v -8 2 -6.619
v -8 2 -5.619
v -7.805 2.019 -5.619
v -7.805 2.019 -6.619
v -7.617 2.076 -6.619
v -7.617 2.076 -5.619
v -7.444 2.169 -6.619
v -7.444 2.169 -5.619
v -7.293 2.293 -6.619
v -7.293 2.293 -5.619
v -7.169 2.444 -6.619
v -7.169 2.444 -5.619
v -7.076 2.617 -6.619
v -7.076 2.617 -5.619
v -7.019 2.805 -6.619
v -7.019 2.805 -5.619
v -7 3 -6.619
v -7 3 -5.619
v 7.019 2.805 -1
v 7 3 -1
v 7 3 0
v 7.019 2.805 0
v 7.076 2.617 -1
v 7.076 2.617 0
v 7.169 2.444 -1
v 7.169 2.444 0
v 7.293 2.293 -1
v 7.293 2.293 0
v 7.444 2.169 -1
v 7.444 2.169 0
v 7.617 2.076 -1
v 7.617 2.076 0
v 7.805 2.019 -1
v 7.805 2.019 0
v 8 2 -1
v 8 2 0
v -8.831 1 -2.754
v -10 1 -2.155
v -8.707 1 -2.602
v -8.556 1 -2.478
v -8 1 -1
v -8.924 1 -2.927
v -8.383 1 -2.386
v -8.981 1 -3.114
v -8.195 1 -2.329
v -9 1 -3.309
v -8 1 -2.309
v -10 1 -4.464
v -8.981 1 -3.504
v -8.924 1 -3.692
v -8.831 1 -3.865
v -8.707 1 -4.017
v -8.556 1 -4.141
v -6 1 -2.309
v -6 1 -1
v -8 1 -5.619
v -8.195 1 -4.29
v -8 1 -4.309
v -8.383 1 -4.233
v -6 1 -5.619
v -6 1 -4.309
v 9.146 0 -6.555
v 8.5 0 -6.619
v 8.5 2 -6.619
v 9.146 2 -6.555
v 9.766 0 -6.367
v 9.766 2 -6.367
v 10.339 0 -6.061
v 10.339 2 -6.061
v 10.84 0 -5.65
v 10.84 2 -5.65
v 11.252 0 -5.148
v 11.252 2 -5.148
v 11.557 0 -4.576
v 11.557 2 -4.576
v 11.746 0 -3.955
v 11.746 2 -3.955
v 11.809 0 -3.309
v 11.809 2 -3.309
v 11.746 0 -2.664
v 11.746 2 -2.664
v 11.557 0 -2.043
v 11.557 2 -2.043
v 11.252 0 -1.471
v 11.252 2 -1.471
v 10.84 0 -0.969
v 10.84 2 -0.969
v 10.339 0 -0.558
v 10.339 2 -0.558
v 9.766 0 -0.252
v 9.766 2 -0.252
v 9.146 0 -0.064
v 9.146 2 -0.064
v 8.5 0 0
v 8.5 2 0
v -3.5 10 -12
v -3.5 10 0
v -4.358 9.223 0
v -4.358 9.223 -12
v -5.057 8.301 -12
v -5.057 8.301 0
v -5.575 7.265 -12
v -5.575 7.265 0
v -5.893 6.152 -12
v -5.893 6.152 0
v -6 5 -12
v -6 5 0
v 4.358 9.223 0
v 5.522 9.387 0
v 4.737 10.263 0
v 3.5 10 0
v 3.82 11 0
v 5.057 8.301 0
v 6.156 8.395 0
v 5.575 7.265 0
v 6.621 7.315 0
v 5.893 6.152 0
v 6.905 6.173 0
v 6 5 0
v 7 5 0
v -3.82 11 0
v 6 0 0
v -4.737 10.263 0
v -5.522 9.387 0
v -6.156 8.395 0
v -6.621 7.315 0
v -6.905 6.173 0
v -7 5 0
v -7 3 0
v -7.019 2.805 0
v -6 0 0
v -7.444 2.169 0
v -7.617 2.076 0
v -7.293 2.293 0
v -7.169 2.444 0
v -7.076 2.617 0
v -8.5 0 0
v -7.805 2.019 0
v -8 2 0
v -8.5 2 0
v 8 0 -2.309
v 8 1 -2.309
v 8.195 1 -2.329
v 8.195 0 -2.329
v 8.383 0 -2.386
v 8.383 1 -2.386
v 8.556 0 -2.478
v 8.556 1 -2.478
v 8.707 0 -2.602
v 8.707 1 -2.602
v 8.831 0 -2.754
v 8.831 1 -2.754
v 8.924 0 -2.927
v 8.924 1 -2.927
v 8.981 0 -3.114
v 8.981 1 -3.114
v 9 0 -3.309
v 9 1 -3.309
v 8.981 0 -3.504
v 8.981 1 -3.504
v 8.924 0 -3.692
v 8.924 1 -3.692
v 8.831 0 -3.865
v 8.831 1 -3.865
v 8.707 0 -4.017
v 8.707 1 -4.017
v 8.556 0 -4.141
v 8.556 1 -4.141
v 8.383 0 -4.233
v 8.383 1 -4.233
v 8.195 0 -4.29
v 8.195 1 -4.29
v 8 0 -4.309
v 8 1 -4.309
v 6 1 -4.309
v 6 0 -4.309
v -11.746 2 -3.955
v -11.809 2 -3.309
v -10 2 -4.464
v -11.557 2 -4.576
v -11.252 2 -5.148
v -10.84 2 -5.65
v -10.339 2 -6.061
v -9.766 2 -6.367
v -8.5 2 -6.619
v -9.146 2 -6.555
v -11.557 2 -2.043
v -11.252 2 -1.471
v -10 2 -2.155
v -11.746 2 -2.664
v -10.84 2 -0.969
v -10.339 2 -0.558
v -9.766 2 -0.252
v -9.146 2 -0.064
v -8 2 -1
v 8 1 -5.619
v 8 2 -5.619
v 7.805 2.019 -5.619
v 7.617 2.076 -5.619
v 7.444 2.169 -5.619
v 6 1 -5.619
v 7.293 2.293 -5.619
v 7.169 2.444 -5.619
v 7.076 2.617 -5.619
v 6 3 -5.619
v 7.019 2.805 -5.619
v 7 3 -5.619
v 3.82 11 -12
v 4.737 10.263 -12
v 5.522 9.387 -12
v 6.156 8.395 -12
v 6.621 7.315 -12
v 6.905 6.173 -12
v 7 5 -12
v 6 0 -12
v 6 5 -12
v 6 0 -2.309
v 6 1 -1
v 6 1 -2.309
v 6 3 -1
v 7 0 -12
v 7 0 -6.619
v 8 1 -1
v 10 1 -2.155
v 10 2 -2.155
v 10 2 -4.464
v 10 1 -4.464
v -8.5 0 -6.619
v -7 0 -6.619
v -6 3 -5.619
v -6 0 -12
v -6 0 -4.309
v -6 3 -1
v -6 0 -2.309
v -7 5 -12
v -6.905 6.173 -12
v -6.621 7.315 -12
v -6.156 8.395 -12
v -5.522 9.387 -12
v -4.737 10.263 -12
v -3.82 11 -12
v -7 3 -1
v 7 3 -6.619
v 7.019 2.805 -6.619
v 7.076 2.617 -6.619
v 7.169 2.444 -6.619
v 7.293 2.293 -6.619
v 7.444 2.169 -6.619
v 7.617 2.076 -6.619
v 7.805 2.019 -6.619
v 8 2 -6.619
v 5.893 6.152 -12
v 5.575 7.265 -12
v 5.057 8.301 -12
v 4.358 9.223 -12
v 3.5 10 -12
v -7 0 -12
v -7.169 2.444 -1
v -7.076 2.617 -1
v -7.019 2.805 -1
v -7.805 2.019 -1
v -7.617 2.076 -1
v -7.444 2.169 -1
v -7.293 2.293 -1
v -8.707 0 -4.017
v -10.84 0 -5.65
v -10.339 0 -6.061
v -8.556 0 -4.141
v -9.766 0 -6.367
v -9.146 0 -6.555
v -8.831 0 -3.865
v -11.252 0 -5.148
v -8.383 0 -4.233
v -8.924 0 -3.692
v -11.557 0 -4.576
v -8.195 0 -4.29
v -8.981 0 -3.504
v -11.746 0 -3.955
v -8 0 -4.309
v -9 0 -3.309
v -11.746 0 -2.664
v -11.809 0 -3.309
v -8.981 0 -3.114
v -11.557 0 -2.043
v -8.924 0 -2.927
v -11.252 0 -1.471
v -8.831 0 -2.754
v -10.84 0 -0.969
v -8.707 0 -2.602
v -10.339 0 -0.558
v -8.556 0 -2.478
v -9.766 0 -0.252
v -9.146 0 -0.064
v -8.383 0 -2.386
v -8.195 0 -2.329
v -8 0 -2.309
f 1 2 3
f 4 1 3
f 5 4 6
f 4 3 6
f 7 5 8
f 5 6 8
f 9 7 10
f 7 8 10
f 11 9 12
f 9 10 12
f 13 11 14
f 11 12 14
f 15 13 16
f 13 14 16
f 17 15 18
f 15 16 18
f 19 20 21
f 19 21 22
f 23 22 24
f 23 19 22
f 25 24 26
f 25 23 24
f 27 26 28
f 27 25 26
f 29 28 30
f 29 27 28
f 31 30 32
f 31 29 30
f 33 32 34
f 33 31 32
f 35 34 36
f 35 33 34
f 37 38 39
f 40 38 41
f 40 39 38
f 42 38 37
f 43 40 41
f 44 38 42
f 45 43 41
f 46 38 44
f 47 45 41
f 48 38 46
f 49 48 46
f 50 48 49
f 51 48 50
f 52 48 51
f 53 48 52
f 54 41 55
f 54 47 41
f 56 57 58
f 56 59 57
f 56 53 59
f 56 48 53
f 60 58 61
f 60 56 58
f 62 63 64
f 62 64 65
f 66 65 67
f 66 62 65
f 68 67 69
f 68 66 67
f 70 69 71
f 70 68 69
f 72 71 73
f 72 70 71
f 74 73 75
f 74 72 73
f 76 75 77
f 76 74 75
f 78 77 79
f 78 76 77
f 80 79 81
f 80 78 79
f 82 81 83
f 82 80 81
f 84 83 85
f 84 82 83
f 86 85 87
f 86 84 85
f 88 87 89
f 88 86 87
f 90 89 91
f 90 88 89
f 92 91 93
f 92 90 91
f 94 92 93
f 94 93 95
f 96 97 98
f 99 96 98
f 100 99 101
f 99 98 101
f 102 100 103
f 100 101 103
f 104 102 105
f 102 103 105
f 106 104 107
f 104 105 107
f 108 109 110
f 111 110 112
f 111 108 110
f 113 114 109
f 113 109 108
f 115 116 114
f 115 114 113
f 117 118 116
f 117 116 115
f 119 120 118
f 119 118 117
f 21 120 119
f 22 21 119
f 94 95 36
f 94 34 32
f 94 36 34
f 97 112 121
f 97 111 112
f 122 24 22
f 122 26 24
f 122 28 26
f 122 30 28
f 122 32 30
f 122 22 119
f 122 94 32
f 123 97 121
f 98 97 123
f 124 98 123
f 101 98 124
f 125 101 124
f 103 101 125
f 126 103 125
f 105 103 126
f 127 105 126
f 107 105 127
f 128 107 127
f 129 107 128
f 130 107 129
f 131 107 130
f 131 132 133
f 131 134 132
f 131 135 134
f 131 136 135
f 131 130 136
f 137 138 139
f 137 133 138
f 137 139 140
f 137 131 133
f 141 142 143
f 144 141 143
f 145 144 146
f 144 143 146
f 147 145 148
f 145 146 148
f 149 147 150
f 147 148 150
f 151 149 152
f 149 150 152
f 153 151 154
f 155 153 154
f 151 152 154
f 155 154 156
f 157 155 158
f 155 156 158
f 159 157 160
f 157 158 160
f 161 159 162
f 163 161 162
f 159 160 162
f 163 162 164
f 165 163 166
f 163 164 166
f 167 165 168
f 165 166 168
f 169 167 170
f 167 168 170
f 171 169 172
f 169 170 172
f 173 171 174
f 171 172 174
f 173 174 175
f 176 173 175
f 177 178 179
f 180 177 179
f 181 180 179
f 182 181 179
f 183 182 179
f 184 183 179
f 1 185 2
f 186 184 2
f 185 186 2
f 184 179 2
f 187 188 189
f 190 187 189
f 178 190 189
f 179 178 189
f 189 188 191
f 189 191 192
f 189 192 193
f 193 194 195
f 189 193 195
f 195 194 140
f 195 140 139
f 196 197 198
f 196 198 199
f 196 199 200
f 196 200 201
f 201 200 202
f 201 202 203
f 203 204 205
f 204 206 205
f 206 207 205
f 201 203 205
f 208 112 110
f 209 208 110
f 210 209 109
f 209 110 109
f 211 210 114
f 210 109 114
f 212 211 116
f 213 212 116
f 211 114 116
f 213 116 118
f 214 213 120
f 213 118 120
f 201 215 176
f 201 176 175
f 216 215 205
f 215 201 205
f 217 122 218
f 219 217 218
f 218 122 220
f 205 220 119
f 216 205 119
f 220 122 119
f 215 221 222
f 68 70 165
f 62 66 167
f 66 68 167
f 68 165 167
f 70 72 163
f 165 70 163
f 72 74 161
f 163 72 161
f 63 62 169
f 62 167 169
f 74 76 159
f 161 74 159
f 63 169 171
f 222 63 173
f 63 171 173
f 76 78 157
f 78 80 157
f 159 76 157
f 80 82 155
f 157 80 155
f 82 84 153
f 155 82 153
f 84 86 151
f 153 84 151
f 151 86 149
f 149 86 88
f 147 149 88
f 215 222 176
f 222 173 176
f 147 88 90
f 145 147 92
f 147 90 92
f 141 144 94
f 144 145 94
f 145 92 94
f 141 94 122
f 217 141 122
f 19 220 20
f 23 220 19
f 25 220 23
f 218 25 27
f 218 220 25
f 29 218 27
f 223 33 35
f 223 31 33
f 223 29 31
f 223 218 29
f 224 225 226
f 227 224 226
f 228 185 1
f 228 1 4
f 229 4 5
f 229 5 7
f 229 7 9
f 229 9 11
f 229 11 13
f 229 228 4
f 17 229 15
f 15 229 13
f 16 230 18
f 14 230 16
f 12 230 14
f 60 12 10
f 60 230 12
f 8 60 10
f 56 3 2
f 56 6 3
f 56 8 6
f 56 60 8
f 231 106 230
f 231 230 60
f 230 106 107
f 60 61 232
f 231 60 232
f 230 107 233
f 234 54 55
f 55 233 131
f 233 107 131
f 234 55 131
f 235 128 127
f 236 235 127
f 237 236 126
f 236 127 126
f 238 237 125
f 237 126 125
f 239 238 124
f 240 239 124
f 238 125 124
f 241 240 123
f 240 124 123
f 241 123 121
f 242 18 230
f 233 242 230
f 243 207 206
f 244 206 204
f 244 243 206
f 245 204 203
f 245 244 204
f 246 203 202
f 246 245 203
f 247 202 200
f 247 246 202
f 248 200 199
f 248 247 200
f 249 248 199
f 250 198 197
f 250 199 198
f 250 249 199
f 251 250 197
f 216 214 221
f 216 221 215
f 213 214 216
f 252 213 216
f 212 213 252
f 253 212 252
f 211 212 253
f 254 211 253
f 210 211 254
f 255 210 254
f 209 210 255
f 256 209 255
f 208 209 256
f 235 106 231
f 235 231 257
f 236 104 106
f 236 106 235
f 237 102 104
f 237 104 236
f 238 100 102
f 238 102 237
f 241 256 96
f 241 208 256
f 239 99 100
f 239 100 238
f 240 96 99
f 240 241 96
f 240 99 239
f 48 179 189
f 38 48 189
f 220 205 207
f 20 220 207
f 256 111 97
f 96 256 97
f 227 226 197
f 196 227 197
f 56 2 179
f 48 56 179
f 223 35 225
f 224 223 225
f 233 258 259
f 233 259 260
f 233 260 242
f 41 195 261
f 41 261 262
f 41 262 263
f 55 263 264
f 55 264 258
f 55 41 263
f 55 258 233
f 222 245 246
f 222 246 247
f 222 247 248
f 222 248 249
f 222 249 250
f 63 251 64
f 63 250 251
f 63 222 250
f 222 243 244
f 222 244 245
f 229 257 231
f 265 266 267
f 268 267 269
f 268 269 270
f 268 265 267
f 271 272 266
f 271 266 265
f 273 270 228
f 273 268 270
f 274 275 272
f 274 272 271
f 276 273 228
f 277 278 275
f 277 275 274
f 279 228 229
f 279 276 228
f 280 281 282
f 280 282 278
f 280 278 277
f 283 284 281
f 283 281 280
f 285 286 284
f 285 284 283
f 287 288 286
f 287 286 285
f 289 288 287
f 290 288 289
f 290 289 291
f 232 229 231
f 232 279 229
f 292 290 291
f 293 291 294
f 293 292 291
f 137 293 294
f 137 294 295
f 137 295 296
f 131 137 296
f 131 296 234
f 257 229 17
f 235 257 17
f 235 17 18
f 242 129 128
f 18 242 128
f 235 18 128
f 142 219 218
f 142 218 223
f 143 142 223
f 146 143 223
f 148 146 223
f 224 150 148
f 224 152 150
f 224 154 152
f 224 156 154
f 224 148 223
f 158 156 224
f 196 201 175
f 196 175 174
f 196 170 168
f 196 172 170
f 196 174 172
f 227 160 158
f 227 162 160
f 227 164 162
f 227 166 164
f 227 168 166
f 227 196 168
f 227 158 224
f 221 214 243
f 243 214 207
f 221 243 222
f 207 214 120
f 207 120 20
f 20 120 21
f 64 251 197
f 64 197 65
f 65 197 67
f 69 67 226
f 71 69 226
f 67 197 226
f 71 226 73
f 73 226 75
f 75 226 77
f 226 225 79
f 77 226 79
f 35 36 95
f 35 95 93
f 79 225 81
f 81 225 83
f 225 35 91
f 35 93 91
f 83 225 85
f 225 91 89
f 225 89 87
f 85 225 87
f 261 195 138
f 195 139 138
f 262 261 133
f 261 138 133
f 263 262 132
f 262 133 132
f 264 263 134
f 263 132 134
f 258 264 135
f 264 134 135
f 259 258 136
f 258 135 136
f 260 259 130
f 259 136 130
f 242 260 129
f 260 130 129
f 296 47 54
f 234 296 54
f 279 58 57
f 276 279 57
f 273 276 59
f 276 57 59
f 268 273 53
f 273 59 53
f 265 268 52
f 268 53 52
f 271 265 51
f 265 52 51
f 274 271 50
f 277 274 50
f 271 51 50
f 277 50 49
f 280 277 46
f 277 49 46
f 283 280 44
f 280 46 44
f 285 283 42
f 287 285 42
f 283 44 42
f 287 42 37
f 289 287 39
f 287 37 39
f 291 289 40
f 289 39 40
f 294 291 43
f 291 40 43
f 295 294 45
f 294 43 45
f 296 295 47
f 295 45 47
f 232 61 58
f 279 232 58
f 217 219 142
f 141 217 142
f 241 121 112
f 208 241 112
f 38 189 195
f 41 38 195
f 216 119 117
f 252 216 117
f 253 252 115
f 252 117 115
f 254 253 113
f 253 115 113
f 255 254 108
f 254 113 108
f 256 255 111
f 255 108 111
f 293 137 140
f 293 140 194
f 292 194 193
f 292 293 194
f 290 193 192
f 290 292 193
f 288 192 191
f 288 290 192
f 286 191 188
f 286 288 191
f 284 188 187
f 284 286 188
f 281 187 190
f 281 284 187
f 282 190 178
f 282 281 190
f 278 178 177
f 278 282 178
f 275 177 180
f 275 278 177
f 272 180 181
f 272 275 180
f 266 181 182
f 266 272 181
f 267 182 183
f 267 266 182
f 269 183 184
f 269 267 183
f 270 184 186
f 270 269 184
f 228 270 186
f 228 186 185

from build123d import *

# Parameters (mm, degrees)
BOSS_EXTRUDE1_DEPTH     = 12
BOSS_EXTRUDE3_DEPTH     = 2
FILLET2_R               = 1
CUT_EXTRUDE7_DEPTH      = 3
CUT_EXTRUDE8_DEPTH      = 1
CUT_EXTRUDE8_DEPTH_BACK = 1


with BuildPart() as part:
    # Sketch1 → Boss-Extrude1 (new body)
    with BuildSketch(Plane.XY):
        with BuildLine():
            Line((3.5, 10), (-3.5, 10))
            ThreePointArc((-3.5, 10), (-5.340169944, 7.795084972), (-6, 5))
            Line((-6, 5), (-6, 0))
            Line((-6, 0), (-7, 0))
            Line((-7, 0), (-7, 1))
            Line((-7, 1), (-7, 5))
            ThreePointArc((-7, 5), (-6.155773268, 8.395374624), (-3.819705149, 11))
            Line((-3.819705149, 11), (3.819705149, 11))
            ThreePointArc((3.819705149, 11), (6.155773268, 8.395374624), (7, 5))
            Line((7, 5), (7, 1))
            Line((7, 1), (7, 0))
            Line((7, 0), (6, 0))
            Line((6, 0), (6, 5))
            ThreePointArc((6, 5), (5.340169944, 7.795084972), (3.5, 10))
        make_face()
    extrude(amount=-BOSS_EXTRUDE1_DEPTH)

    # Sketch4 → Boss-Extrude3 (add)
    with BuildSketch(Plane.XZ):
        with BuildLine():
            Line((-7, 0), (-8.5, 0))
            ThreePointArc((-8.5, 0), (-11.809401077, -3.309401077), (-8.5, -6.618802154))
            Line((-8.5, -6.618802154), (-7, -6.618802154))
            Line((-7, -6.618802154), (-7, 0))
        make_face()
        with BuildLine():
            ThreePointArc((8.5, -6.618802154), (11.809401077, -3.309401077), (8.5, 0))
            Line((8.5, 0), (7, 0))
            Line((7, 0), (7, -6.618802154))
            Line((7, -6.618802154), (8.5, -6.618802154))
        make_face()
    extrude(amount=-BOSS_EXTRUDE3_DEPTH)

    # Fillet2
    fillet2_edges = [part.edges().sort_by_distance(p)[0] for p in [
        (-7, 2, -3.309401077),
        (7, 2, -3.309401077),
    ]]
    fillet(fillet2_edges, radius=FILLET2_R)

    # Sketch5 → Cut-Extrude7 (cut)
    with BuildSketch(Plane(origin=(0, 2, 0), x_dir=(1, 0, 0), z_dir=(0, 1, 0))):
        with BuildLine():
            Line((-7, 4.309401077), (-8, 4.309401077))
            ThreePointArc((-8, 4.309401077), (-9, 3.309401077), (-8, 2.309401077))
            Line((-8, 2.309401077), (-7, 2.309401077))
            Line((-7, 2.309401077), (-3.819705149, 2.309401077))
            Line((-3.819705149, 2.309401077), (-3.819705149, 4.309401077))
            Line((-3.819705149, 4.309401077), (-7, 4.309401077))
        make_face()
        with BuildLine():
            Line((3.819705149, 2.309401077), (7, 2.309401077))
            Line((7, 2.309401077), (8, 2.309401077))
            ThreePointArc((8, 2.309401077), (9, 3.309401077), (8, 4.309401077))
            Line((8, 4.309401077), (7, 4.309401077))
            Line((7, 4.309401077), (3.819705149, 4.309401077))
            Line((3.819705149, 4.309401077), (3.819705149, 2.309401077))
        make_face()
    extrude(amount=-CUT_EXTRUDE7_DEPTH, mode=Mode.SUBTRACT)

    # Sketch6 → Cut-Extrude8 (cut, two sides)
    with BuildSketch(Plane(origin=(0, 2, 0), x_dir=(1, 0, 0), z_dir=(0, 1, 0))) as cut_extrude8_sk:
        Polygon((-8, 5.618802154), (-10, 4.464101615), (-10, 2.154700538), (-8, 1), (-6, 1), (-6, 5.618802154), align=None)
        Polygon((6, 1), (8, 1), (10, 2.154700538), (10, 4.464101615), (8, 5.618802154), (6, 5.618802154), align=None)
    extrude(amount=CUT_EXTRUDE8_DEPTH, mode=Mode.SUBTRACT)
    extrude(cut_extrude8_sk.sketch, amount=-CUT_EXTRUDE8_DEPTH_BACK, mode=Mode.SUBTRACT)


solid = part.part
